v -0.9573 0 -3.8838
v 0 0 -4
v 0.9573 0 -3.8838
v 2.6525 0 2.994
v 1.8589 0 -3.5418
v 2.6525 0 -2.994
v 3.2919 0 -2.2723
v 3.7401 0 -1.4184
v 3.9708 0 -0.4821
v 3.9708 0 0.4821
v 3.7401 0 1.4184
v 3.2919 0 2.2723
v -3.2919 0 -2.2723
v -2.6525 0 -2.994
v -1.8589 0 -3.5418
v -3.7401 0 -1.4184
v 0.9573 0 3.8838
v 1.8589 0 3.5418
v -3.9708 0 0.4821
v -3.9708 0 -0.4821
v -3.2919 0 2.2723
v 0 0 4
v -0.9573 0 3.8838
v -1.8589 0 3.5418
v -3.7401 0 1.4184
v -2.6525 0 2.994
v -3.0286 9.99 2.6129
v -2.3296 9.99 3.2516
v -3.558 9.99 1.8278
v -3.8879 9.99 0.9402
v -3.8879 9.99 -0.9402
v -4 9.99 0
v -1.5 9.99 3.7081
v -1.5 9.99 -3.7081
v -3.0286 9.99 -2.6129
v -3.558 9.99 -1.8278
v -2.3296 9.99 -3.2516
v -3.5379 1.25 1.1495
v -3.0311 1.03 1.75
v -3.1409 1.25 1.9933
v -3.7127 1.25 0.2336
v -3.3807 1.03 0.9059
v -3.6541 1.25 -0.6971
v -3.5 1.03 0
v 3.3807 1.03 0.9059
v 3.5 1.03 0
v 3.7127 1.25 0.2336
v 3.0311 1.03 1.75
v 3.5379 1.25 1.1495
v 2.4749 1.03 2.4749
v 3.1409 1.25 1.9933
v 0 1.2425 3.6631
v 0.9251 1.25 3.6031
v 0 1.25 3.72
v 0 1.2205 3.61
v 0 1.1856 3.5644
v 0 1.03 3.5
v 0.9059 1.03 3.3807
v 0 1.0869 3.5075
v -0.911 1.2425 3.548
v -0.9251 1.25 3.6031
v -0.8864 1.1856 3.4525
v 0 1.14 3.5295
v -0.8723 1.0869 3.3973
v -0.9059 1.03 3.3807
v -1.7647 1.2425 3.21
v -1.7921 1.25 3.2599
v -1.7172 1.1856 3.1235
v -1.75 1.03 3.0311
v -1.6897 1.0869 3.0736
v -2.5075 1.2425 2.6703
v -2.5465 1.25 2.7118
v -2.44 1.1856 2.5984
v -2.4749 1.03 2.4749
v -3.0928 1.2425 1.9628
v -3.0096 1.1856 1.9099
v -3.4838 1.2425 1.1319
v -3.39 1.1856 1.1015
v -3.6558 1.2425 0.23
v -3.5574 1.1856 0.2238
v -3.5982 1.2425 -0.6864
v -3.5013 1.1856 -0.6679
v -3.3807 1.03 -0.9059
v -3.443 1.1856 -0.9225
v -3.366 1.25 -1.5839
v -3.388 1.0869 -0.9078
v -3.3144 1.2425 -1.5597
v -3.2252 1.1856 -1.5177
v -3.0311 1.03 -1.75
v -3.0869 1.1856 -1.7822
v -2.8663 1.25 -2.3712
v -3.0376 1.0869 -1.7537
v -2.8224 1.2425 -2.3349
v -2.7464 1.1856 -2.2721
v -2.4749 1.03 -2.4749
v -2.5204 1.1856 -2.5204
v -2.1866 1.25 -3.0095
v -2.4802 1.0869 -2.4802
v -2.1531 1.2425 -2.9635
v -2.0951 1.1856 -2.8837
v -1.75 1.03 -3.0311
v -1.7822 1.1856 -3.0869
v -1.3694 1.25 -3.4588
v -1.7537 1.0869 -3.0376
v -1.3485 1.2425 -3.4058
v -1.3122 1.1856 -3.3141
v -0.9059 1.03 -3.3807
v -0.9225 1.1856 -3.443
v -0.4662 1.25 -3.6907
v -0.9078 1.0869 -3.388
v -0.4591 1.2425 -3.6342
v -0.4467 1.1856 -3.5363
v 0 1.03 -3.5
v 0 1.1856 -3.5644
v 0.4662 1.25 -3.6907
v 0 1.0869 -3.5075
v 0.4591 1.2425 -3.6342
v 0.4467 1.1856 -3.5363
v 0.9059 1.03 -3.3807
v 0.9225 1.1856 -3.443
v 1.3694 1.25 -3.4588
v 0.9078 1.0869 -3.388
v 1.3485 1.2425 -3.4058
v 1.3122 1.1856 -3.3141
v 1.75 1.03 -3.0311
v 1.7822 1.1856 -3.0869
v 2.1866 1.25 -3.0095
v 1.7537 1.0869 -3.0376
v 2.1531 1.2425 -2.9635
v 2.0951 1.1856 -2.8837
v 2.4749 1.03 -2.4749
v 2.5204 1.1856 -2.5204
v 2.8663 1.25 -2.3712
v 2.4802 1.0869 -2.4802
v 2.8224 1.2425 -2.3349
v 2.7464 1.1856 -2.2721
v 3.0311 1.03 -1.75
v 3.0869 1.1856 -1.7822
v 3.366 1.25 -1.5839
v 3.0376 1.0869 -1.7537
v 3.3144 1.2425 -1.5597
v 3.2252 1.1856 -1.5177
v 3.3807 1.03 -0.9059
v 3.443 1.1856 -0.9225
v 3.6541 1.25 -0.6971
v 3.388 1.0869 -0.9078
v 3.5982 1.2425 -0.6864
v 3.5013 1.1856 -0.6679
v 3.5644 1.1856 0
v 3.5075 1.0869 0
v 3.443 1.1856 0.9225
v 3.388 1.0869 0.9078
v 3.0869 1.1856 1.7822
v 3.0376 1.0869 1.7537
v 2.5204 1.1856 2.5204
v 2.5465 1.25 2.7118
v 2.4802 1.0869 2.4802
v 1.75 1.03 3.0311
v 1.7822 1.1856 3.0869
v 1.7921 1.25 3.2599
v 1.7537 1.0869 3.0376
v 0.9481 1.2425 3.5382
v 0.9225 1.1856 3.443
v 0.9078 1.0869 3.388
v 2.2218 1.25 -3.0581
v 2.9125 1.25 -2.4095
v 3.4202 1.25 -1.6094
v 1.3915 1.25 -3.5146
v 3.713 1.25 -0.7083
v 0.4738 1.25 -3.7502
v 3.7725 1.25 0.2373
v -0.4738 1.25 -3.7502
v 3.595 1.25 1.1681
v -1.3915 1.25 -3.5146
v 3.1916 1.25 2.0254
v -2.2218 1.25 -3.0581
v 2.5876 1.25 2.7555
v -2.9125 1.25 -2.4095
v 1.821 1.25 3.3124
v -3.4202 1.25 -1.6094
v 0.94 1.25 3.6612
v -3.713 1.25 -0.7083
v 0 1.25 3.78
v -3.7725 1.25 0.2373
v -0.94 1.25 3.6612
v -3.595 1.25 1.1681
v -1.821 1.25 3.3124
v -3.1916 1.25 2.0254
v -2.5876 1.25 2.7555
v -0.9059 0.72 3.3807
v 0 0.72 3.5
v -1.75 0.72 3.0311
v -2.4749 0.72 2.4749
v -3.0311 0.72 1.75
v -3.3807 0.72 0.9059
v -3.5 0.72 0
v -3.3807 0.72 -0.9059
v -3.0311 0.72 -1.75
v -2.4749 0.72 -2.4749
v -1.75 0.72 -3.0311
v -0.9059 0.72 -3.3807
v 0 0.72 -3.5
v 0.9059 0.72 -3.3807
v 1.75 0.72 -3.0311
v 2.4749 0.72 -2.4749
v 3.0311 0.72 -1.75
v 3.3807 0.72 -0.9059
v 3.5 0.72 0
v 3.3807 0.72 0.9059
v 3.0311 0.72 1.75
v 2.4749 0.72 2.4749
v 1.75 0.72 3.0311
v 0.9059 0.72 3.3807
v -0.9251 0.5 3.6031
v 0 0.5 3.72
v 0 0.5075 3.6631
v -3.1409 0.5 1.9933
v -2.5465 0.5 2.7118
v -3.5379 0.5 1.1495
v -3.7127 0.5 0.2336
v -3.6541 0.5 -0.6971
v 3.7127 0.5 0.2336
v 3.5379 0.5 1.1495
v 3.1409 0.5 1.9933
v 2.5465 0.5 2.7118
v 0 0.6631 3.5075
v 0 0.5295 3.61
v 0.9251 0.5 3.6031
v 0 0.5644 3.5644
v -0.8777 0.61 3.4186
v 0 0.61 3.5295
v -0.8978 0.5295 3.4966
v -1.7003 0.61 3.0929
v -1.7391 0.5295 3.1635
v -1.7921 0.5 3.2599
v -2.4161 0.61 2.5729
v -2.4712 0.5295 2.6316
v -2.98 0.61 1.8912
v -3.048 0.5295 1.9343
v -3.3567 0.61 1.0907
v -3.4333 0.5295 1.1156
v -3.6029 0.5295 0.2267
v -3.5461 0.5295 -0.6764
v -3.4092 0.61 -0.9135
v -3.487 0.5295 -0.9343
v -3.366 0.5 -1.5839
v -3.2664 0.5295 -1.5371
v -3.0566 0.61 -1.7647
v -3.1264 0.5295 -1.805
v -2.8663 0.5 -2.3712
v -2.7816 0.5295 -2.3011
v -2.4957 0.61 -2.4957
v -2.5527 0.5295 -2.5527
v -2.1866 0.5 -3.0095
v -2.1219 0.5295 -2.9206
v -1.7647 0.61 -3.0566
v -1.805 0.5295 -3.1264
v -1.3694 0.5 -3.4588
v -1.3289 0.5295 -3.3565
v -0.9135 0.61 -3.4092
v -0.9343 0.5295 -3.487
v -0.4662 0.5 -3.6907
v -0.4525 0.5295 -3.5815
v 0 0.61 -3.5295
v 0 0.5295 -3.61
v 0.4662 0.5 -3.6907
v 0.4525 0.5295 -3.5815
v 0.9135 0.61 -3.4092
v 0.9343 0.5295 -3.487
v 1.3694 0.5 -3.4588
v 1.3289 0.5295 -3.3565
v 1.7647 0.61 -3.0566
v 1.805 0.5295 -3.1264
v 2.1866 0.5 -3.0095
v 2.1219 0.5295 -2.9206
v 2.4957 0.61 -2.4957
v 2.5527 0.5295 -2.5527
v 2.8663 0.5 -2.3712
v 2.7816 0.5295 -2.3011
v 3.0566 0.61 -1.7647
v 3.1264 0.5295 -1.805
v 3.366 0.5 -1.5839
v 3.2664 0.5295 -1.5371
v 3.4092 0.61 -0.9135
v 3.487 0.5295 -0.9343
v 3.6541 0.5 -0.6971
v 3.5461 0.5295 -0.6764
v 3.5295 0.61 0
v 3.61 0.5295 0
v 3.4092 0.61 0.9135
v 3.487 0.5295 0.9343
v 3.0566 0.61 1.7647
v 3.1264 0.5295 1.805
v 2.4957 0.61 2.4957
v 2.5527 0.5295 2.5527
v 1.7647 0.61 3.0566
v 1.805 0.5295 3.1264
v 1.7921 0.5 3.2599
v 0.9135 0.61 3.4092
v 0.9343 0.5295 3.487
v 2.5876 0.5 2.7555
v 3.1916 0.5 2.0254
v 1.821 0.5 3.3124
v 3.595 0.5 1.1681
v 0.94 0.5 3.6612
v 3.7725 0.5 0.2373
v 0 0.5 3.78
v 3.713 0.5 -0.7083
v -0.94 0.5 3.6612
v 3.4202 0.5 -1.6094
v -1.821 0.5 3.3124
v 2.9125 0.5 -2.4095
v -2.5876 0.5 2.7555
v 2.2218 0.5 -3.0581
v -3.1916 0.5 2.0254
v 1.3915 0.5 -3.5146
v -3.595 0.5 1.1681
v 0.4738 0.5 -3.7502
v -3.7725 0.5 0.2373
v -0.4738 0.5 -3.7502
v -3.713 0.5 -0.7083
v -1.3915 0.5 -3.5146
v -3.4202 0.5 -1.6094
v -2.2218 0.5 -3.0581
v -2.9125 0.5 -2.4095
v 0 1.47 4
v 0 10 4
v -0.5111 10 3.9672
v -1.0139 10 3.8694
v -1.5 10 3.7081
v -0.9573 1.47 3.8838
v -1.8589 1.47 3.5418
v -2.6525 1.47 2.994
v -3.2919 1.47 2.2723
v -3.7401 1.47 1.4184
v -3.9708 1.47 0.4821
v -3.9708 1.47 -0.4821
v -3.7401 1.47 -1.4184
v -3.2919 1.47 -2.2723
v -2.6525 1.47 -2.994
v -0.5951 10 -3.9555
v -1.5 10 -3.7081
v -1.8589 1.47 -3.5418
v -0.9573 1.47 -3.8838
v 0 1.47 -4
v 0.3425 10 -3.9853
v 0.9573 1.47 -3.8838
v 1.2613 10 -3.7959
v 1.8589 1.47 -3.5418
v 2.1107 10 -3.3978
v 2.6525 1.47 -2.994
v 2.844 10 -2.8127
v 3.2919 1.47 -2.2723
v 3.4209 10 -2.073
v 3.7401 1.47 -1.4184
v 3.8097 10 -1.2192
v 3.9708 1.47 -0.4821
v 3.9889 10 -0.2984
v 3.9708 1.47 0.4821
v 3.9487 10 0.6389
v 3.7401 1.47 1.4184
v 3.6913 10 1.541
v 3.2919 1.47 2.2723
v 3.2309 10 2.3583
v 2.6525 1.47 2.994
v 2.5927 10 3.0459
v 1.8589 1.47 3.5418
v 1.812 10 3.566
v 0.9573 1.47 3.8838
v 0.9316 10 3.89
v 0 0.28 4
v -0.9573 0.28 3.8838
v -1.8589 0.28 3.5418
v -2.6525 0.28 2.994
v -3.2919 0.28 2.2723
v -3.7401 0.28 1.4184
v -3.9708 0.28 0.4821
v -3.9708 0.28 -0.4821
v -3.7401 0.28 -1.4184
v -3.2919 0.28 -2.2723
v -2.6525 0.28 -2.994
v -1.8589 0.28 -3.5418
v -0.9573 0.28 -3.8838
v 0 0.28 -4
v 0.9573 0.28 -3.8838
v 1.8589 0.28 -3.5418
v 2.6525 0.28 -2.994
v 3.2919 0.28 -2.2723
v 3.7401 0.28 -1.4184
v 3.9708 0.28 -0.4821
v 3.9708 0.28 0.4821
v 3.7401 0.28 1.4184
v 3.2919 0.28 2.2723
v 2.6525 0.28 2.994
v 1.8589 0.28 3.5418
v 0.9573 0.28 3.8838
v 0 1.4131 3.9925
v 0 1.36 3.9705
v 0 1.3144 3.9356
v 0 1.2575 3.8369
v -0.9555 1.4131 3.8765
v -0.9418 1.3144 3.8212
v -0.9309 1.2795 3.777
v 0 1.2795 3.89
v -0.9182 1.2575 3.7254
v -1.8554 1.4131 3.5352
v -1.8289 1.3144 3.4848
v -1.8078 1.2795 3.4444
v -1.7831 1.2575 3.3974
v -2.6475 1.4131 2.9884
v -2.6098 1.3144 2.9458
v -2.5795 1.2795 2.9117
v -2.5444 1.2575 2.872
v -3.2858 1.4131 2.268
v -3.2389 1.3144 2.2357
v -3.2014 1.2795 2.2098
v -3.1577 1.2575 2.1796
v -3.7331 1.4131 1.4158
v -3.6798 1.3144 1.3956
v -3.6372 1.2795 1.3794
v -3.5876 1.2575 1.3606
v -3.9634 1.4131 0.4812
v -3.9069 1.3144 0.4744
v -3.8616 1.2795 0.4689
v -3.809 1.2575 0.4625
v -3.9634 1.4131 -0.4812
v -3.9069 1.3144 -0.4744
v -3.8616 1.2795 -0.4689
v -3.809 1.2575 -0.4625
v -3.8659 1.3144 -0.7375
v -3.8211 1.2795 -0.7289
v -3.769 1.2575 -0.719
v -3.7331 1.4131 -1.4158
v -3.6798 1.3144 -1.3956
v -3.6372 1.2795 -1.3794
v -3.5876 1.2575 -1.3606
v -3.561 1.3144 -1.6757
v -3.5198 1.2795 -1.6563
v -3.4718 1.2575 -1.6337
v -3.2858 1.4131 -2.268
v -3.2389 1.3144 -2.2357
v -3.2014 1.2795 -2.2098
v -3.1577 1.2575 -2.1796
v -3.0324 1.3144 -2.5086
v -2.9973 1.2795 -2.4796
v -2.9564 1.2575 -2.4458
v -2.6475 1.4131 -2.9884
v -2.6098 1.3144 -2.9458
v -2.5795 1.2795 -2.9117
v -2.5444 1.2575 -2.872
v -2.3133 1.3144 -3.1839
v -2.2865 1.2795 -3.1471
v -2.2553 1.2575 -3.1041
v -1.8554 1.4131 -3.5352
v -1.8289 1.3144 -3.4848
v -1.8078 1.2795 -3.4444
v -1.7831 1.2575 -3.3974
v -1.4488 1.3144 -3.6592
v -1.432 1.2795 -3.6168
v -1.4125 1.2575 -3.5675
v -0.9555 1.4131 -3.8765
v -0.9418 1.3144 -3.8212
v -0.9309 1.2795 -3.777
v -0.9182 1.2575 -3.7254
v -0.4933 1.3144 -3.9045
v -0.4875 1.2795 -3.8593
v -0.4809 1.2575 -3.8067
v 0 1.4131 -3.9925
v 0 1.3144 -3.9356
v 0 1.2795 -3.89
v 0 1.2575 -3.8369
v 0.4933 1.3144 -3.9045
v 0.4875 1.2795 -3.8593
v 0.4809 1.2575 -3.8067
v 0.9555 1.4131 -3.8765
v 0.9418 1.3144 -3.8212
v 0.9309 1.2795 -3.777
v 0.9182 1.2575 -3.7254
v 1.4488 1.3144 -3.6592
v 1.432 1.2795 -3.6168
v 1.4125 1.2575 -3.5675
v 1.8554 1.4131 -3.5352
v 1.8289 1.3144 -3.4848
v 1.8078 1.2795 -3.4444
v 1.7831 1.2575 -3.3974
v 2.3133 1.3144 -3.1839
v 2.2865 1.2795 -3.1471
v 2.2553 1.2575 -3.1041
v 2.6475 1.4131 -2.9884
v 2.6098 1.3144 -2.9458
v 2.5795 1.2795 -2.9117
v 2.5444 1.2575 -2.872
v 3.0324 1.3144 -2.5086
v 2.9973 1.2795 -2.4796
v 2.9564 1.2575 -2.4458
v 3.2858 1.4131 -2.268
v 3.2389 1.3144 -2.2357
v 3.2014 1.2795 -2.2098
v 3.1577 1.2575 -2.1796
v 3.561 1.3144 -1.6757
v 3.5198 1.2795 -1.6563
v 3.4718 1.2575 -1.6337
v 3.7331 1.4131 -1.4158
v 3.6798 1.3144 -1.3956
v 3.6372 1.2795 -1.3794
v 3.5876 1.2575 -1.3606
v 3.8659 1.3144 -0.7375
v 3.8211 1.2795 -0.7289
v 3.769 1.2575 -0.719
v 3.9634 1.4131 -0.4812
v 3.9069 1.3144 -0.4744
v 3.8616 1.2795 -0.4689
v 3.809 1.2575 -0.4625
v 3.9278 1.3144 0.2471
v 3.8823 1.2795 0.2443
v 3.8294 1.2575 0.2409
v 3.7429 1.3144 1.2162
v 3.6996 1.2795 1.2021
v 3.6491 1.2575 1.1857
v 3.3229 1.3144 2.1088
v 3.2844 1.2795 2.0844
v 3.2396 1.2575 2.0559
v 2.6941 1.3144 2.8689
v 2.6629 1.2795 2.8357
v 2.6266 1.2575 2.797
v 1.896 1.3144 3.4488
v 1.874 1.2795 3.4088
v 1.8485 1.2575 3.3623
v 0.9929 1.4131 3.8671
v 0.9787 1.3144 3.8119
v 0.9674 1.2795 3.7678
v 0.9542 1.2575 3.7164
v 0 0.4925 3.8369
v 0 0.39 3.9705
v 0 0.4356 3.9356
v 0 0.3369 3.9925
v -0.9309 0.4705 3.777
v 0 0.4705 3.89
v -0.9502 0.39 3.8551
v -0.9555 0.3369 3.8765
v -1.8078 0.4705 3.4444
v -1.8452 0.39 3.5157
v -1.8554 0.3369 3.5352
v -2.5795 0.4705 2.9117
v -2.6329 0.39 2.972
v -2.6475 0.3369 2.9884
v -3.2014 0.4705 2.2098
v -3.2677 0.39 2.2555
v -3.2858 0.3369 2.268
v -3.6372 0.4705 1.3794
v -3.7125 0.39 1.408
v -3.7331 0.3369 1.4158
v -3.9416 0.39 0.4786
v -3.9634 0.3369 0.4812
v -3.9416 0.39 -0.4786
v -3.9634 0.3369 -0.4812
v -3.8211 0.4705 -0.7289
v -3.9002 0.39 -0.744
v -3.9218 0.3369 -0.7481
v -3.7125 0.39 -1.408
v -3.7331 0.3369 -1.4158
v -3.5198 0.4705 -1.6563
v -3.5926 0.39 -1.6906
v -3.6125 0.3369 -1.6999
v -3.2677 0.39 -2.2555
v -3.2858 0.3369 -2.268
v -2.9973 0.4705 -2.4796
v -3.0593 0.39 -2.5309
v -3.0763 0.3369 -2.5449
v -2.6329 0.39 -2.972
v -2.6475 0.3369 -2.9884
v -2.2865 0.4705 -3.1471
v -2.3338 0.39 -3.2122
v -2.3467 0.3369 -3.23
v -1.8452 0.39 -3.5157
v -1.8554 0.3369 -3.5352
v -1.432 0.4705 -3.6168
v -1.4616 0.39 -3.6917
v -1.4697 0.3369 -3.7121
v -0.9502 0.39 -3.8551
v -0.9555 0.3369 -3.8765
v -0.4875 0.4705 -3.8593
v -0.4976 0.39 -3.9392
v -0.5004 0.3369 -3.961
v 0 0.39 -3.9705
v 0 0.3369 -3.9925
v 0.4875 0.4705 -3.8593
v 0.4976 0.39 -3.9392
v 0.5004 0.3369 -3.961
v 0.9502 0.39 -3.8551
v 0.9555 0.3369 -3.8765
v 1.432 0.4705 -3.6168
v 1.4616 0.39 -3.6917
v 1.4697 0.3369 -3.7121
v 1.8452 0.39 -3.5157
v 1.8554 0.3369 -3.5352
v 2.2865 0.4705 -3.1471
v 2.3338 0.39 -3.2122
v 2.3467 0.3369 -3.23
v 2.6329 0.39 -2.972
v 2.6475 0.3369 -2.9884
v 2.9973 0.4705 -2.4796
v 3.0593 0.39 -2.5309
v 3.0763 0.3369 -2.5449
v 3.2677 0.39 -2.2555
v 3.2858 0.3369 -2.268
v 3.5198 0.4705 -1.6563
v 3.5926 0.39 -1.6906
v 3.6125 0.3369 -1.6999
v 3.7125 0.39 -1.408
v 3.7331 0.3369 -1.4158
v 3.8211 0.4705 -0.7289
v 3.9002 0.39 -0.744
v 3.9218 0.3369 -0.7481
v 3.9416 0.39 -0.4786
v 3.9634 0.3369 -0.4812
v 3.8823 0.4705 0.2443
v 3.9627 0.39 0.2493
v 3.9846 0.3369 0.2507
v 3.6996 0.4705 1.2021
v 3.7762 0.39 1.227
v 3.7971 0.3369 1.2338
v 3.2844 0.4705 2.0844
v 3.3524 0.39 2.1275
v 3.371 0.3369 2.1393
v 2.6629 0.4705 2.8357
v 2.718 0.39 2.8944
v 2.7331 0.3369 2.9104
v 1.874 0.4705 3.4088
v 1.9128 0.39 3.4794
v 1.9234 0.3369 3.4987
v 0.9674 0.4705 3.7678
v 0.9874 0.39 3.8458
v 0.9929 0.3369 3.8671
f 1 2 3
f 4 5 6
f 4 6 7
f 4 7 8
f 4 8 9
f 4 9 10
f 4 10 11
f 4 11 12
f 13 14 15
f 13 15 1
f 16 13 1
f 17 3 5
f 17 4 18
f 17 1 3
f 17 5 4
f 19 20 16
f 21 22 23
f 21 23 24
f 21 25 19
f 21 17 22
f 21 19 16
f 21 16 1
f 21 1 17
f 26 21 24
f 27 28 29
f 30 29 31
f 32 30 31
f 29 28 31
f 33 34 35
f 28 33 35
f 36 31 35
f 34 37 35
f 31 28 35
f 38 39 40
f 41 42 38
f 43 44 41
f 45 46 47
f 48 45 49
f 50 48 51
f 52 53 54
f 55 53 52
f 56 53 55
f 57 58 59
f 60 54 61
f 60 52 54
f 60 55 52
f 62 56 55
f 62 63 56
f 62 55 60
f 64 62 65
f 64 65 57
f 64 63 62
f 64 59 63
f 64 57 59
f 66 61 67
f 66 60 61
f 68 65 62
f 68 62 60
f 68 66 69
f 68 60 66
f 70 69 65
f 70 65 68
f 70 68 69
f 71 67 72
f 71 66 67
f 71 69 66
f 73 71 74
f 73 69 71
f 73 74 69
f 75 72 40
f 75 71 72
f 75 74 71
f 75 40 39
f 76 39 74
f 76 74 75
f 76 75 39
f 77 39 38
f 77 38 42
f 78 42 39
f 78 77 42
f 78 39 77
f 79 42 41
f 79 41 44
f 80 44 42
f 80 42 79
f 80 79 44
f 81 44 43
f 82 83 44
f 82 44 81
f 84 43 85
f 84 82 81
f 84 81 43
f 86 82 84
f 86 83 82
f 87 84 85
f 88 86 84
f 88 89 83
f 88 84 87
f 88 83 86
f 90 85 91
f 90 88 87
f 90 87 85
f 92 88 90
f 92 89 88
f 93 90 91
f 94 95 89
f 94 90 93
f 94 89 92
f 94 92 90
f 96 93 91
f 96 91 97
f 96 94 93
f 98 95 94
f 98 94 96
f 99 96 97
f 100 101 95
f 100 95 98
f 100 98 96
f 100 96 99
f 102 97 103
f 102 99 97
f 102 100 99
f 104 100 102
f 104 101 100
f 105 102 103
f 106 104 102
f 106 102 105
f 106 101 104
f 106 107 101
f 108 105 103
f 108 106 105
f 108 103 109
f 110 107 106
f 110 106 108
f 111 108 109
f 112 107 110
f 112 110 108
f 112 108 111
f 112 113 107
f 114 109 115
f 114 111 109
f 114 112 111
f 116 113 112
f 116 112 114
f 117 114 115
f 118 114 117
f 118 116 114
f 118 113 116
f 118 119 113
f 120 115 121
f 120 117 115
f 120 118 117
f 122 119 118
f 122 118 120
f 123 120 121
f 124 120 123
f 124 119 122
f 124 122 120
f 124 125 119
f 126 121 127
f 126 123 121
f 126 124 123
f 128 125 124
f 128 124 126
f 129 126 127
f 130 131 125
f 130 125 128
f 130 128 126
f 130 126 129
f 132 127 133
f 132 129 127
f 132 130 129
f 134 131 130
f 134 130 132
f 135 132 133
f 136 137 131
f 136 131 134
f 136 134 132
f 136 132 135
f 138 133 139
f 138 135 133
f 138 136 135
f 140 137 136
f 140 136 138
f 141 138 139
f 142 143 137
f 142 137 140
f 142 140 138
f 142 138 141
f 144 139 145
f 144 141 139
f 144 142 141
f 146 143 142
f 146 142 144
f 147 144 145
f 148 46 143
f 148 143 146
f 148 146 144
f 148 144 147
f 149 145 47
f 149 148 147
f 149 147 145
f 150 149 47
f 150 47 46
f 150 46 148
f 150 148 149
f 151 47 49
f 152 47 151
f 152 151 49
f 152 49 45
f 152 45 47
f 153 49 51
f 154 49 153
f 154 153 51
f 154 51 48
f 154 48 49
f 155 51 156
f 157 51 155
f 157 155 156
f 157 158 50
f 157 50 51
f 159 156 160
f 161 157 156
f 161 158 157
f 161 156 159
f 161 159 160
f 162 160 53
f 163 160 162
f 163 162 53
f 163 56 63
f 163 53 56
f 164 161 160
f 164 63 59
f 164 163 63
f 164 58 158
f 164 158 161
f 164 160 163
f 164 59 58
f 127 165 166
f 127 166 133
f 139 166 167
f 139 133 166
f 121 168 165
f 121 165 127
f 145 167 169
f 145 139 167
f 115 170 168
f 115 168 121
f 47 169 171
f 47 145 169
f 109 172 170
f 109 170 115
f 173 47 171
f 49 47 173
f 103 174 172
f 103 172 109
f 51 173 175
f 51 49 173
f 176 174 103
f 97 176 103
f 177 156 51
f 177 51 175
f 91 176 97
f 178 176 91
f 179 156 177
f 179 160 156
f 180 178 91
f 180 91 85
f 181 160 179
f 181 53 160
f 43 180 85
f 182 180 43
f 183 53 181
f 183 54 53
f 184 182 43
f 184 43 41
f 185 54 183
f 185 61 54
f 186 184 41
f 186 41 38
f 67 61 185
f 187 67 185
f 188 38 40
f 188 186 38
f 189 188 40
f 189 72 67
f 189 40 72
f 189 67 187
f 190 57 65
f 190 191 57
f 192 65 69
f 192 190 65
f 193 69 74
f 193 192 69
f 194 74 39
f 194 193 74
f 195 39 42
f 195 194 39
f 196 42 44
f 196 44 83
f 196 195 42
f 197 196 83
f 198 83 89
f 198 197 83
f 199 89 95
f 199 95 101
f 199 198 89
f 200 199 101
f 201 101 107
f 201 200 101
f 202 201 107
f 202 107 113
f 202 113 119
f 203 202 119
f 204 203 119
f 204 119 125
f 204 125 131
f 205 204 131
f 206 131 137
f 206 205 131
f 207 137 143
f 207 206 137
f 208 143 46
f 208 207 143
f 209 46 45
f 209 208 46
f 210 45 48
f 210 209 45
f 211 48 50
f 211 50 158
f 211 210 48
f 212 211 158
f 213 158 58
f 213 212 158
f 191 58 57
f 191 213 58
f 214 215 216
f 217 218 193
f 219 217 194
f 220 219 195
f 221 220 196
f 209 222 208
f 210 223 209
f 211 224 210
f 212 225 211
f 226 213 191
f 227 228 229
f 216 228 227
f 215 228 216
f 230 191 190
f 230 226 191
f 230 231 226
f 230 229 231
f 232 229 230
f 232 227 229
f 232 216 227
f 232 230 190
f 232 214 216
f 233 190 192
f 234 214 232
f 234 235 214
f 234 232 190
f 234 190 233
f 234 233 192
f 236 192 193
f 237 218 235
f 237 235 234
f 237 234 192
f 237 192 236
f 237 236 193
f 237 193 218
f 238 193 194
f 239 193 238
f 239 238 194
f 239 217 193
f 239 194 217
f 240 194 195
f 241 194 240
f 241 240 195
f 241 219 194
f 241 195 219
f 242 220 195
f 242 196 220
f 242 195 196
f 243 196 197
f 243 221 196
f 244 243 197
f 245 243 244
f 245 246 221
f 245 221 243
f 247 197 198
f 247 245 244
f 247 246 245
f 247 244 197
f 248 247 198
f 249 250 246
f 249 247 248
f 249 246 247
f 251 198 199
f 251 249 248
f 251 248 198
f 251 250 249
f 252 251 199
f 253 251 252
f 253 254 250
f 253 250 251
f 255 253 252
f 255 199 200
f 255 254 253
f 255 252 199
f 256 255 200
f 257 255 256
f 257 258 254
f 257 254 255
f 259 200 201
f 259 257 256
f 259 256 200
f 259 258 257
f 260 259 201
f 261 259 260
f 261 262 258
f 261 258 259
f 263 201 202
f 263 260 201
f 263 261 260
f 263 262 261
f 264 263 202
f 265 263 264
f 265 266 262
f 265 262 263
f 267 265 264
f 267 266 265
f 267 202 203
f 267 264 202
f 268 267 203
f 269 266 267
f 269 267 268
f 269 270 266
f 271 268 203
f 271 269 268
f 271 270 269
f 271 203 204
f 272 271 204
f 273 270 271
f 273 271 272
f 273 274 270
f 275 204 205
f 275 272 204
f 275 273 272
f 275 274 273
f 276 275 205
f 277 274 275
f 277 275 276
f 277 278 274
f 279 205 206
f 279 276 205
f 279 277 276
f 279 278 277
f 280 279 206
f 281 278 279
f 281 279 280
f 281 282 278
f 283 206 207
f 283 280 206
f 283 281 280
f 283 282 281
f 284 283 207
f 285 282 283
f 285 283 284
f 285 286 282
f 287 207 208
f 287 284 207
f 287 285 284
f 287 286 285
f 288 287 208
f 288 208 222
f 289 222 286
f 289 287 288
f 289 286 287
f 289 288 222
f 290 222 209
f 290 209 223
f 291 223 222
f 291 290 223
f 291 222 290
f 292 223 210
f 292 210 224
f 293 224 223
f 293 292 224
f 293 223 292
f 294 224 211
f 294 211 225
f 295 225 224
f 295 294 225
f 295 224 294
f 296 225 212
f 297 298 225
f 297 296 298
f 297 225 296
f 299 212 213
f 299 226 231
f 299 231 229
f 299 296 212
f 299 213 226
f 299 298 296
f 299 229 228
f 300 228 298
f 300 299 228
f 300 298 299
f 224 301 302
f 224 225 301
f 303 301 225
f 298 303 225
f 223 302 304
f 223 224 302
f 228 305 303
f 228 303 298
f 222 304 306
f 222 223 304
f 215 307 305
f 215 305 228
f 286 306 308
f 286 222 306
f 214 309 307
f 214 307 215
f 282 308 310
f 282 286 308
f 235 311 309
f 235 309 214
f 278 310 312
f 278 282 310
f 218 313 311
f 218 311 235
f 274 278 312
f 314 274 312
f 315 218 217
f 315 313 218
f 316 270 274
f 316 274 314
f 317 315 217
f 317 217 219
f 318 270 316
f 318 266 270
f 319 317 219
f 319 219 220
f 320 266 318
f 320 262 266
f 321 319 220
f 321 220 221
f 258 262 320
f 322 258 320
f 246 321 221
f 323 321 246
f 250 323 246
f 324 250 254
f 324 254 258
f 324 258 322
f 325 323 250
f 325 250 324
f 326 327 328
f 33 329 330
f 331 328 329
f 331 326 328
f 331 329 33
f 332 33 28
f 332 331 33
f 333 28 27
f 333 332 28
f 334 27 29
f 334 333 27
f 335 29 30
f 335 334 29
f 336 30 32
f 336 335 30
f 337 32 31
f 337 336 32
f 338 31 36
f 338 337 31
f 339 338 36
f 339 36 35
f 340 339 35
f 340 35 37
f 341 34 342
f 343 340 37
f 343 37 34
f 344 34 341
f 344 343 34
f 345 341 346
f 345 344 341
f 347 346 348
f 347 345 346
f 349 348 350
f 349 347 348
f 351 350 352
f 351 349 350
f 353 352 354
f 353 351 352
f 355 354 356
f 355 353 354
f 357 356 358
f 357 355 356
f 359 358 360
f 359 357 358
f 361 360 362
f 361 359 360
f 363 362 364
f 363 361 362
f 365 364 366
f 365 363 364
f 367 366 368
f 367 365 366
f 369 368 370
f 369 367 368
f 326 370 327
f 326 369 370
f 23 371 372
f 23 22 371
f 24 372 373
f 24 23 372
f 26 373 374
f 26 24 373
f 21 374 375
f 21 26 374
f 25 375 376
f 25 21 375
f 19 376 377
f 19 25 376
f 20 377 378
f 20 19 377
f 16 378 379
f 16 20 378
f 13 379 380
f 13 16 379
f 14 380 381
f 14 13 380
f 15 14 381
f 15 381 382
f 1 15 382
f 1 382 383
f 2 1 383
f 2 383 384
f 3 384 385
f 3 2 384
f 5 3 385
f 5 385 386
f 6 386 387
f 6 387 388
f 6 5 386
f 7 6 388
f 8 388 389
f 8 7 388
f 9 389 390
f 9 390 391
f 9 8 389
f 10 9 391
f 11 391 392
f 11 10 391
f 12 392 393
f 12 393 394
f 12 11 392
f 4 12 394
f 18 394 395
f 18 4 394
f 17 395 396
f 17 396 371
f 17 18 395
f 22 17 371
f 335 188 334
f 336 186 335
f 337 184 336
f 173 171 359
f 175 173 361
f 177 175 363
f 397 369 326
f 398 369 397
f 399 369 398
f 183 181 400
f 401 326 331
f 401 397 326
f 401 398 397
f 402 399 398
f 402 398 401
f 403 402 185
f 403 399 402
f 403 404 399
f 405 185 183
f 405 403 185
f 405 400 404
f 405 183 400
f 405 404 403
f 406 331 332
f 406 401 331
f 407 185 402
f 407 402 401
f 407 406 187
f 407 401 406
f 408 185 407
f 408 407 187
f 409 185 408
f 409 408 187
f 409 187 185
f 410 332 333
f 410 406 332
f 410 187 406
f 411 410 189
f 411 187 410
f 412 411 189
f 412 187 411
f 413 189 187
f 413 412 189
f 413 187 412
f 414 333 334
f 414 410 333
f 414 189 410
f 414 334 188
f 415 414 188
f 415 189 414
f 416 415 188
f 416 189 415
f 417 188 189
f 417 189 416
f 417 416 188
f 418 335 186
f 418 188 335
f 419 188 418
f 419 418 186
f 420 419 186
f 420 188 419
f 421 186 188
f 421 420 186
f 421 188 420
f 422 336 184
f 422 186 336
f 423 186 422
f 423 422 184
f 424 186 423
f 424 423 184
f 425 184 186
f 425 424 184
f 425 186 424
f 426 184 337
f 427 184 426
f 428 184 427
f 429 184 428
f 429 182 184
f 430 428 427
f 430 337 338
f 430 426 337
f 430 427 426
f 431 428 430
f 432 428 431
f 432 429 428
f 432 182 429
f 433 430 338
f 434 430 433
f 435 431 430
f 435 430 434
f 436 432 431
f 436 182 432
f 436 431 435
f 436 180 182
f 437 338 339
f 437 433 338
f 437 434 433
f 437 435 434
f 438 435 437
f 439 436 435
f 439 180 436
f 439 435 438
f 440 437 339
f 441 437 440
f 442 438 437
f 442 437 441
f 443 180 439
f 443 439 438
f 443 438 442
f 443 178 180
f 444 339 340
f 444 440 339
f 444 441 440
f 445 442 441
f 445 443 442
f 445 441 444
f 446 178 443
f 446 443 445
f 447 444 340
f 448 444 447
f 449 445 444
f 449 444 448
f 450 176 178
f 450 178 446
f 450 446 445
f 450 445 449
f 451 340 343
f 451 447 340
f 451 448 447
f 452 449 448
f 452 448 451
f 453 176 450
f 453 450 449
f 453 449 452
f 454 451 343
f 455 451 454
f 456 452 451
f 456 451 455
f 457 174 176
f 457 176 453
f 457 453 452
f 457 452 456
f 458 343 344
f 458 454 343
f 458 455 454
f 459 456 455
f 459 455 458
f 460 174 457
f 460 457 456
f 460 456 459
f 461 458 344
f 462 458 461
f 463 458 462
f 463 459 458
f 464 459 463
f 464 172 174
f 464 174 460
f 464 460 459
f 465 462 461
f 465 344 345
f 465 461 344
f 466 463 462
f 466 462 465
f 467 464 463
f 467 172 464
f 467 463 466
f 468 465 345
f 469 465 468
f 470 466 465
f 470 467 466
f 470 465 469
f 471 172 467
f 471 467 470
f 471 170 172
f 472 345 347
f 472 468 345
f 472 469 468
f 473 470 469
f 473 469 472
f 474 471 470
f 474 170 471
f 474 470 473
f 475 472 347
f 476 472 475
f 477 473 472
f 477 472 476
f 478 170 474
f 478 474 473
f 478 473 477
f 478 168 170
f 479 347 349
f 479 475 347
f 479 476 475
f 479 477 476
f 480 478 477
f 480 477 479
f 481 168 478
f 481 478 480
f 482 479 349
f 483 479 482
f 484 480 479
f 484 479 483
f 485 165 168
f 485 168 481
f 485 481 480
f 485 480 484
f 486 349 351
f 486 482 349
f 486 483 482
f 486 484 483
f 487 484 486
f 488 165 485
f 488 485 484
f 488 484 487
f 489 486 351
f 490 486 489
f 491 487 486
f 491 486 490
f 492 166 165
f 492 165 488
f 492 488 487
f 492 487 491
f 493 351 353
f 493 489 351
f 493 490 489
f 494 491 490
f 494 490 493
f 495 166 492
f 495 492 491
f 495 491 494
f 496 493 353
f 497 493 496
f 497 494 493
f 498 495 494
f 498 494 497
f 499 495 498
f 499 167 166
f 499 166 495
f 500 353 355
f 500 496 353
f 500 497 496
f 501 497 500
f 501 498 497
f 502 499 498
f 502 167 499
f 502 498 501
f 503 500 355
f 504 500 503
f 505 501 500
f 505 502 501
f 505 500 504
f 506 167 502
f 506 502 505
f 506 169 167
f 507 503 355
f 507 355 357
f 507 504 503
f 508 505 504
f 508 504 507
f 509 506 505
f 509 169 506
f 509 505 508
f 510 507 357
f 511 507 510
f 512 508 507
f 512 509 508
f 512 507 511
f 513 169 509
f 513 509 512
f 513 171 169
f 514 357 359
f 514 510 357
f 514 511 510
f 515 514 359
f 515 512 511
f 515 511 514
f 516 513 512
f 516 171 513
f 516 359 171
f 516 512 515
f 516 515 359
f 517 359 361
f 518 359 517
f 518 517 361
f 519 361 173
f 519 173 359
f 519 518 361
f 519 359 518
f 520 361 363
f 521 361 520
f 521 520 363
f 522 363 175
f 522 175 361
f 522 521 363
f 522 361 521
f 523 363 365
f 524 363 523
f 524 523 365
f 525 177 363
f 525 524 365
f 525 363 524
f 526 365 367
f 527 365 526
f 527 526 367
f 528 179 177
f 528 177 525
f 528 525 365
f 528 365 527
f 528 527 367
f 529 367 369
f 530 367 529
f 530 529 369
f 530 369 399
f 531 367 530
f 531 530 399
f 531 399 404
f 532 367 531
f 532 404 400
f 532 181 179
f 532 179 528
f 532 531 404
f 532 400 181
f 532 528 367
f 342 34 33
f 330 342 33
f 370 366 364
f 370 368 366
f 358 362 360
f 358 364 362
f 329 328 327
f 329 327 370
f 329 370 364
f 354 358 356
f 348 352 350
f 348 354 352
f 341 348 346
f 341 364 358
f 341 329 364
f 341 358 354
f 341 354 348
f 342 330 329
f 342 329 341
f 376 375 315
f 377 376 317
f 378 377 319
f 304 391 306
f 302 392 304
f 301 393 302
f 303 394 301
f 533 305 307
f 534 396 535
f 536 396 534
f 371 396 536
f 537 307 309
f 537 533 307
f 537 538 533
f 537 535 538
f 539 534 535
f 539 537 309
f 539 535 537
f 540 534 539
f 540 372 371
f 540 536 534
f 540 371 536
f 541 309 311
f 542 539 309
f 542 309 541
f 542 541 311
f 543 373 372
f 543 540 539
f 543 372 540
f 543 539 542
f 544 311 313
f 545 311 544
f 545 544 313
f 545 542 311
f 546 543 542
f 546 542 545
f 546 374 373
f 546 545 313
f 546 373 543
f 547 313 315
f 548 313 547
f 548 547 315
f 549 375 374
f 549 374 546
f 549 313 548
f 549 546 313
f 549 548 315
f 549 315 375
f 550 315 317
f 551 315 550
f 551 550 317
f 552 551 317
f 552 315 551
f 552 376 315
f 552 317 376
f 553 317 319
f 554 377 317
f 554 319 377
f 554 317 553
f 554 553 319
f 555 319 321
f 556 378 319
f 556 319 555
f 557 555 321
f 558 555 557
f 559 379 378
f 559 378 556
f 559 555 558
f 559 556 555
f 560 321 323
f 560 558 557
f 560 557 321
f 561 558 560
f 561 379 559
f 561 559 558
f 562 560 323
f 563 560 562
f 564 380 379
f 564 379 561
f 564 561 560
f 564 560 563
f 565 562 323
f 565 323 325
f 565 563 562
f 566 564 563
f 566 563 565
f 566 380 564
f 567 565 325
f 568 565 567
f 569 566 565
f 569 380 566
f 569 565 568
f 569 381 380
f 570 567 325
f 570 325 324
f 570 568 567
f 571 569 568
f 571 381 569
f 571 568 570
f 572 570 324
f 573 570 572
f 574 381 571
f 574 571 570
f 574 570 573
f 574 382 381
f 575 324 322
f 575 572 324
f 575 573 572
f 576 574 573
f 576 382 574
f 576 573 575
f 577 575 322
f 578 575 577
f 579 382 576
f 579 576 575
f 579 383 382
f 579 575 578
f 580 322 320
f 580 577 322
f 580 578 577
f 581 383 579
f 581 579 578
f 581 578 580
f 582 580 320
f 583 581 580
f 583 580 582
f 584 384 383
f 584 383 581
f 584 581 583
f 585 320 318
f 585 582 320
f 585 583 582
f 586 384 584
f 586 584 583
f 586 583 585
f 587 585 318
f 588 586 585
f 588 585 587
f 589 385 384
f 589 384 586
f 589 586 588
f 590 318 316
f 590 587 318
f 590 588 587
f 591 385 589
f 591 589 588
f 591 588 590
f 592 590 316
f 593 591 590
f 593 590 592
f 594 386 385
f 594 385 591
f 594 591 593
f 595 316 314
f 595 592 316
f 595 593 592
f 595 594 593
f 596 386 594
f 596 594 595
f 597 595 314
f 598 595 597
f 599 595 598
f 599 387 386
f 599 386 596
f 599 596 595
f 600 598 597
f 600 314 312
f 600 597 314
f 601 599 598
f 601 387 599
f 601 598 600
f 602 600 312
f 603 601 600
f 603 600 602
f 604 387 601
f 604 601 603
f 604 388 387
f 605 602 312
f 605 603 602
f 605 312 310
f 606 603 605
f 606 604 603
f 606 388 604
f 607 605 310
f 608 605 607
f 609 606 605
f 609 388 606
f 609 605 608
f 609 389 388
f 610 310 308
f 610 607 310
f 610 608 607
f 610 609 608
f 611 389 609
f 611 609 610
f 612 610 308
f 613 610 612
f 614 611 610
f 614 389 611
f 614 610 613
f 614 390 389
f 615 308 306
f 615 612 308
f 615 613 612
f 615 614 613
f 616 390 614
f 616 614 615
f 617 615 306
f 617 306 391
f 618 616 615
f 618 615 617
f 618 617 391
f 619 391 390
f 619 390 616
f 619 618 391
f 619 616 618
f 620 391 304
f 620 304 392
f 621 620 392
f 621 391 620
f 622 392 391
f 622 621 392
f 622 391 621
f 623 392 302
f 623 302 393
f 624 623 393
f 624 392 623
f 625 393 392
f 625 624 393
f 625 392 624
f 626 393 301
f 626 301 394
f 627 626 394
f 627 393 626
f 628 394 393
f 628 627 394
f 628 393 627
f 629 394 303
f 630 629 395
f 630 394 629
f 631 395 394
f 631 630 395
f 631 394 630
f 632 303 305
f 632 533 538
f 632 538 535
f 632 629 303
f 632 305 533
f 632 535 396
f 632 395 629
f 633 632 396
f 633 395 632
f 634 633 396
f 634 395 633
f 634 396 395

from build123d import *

# Parameters (mm, degrees)
CUT_EXTRUDE1_START = -0.01
CUT_EXTRUDE1_DEPTH = 0.01


with BuildPart() as part:
    # Sketch1 → Revolve1 (revolve)
    with BuildSketch(Plane.XY, mode=Mode.PRIVATE) as revolve1_sk:
        with BuildLine():
            Line((0, 0), (0, 10))
            Line((0, 10), (4, 10))
            Line((4, 10), (4, 1.47))
            ThreePointArc((4, 1.47), (3.935563492, 1.314436508), (3.78, 1.25))
            Line((3.78, 1.25), (3.72, 1.25))
            ThreePointArc((3.72, 1.25), (3.564436508, 1.185563492), (3.5, 1.03))
            Line((3.5, 1.03), (3.5, 0.72))
            ThreePointArc((3.5, 0.72), (3.564436508, 0.564436508), (3.72, 0.5))
            Line((3.72, 0.5), (3.78, 0.5))
            ThreePointArc((3.78, 0.5), (3.935563492, 0.435563492), (4, 0.28))
            Line((4, 0.28), (4, 0))
            Line((4, 0), (0, 0))
        make_face()
    revolve(revolve1_sk.sketch.rotate(Axis((0, 10, 0), (0, -1, 0)), 90), axis=Axis((0, 10, 0), (0, -1, 0)))

    # Sketch2 → Cut-Extrude1 (cut)
    with BuildSketch(Plane(origin=(0, 10, 0), x_dir=(1, 0, 0), z_dir=(0, 1, 0)).offset(CUT_EXTRUDE1_START)):
        with BuildLine():
            Line((-1.5, 3.708099244), (-1.5, -3.708099244))
            ThreePointArc((-1.5, -3.708099244), (-4, 0), (-1.5, 3.708099244))
        make_face()
    extrude(amount=CUT_EXTRUDE1_DEPTH, mode=Mode.SUBTRACT)


solid = part.part
